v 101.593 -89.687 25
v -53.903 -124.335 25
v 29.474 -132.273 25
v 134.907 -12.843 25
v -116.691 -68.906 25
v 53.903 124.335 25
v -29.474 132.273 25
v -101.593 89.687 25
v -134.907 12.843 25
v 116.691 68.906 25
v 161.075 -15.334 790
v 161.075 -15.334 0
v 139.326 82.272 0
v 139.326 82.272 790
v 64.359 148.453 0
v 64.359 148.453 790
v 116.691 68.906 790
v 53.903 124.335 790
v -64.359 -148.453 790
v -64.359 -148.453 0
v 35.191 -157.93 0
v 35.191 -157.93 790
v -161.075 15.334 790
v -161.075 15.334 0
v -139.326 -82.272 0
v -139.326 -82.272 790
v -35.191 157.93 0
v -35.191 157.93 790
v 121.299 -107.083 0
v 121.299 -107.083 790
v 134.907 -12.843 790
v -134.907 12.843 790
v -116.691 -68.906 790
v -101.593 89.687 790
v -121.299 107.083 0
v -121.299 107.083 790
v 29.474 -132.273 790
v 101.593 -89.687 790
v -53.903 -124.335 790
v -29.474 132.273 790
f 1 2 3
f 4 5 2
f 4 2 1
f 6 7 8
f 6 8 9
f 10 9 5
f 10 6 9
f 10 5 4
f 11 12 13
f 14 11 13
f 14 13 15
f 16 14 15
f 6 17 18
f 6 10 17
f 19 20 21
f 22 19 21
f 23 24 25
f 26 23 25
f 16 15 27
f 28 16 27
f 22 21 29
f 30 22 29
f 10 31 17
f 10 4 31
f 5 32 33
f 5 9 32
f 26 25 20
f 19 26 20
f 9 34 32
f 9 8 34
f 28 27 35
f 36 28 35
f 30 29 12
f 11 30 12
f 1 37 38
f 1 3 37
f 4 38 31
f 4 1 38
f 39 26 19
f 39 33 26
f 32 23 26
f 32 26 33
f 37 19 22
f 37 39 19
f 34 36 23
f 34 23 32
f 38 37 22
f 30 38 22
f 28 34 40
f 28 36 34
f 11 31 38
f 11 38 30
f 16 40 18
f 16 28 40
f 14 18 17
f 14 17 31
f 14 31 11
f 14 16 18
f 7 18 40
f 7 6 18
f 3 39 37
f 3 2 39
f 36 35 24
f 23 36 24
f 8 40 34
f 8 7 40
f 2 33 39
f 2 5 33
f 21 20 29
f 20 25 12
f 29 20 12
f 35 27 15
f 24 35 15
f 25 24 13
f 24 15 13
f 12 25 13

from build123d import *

# Parameters (mm, degrees)
F1_DEPTH = 790
F2_T     = -25


with BuildPart() as f1:
    # F0 (on Top) → F1 (new body)
    with BuildSketch(Plane.XY):
        Polygon((35.191152, -157.93012), (121.299235, -107.083311), (161.075133, -15.334316), (139.325805, 82.271865), (64.358755, 148.452991), (-35.191152, 157.93012), (-121.299235, 107.083311), (-161.075133, 15.334316), (-139.325805, -82.271865), (-64.358755, -148.452991), align=None)
    extrude(amount=F1_DEPTH)

    # F2
    f2_openings = [f1.faces().sort_by_distance(p)[0] for p in [
        (0, 0, 790),
    ]]
    offset(amount=F2_T, openings=f2_openings)


solid = f1.part
